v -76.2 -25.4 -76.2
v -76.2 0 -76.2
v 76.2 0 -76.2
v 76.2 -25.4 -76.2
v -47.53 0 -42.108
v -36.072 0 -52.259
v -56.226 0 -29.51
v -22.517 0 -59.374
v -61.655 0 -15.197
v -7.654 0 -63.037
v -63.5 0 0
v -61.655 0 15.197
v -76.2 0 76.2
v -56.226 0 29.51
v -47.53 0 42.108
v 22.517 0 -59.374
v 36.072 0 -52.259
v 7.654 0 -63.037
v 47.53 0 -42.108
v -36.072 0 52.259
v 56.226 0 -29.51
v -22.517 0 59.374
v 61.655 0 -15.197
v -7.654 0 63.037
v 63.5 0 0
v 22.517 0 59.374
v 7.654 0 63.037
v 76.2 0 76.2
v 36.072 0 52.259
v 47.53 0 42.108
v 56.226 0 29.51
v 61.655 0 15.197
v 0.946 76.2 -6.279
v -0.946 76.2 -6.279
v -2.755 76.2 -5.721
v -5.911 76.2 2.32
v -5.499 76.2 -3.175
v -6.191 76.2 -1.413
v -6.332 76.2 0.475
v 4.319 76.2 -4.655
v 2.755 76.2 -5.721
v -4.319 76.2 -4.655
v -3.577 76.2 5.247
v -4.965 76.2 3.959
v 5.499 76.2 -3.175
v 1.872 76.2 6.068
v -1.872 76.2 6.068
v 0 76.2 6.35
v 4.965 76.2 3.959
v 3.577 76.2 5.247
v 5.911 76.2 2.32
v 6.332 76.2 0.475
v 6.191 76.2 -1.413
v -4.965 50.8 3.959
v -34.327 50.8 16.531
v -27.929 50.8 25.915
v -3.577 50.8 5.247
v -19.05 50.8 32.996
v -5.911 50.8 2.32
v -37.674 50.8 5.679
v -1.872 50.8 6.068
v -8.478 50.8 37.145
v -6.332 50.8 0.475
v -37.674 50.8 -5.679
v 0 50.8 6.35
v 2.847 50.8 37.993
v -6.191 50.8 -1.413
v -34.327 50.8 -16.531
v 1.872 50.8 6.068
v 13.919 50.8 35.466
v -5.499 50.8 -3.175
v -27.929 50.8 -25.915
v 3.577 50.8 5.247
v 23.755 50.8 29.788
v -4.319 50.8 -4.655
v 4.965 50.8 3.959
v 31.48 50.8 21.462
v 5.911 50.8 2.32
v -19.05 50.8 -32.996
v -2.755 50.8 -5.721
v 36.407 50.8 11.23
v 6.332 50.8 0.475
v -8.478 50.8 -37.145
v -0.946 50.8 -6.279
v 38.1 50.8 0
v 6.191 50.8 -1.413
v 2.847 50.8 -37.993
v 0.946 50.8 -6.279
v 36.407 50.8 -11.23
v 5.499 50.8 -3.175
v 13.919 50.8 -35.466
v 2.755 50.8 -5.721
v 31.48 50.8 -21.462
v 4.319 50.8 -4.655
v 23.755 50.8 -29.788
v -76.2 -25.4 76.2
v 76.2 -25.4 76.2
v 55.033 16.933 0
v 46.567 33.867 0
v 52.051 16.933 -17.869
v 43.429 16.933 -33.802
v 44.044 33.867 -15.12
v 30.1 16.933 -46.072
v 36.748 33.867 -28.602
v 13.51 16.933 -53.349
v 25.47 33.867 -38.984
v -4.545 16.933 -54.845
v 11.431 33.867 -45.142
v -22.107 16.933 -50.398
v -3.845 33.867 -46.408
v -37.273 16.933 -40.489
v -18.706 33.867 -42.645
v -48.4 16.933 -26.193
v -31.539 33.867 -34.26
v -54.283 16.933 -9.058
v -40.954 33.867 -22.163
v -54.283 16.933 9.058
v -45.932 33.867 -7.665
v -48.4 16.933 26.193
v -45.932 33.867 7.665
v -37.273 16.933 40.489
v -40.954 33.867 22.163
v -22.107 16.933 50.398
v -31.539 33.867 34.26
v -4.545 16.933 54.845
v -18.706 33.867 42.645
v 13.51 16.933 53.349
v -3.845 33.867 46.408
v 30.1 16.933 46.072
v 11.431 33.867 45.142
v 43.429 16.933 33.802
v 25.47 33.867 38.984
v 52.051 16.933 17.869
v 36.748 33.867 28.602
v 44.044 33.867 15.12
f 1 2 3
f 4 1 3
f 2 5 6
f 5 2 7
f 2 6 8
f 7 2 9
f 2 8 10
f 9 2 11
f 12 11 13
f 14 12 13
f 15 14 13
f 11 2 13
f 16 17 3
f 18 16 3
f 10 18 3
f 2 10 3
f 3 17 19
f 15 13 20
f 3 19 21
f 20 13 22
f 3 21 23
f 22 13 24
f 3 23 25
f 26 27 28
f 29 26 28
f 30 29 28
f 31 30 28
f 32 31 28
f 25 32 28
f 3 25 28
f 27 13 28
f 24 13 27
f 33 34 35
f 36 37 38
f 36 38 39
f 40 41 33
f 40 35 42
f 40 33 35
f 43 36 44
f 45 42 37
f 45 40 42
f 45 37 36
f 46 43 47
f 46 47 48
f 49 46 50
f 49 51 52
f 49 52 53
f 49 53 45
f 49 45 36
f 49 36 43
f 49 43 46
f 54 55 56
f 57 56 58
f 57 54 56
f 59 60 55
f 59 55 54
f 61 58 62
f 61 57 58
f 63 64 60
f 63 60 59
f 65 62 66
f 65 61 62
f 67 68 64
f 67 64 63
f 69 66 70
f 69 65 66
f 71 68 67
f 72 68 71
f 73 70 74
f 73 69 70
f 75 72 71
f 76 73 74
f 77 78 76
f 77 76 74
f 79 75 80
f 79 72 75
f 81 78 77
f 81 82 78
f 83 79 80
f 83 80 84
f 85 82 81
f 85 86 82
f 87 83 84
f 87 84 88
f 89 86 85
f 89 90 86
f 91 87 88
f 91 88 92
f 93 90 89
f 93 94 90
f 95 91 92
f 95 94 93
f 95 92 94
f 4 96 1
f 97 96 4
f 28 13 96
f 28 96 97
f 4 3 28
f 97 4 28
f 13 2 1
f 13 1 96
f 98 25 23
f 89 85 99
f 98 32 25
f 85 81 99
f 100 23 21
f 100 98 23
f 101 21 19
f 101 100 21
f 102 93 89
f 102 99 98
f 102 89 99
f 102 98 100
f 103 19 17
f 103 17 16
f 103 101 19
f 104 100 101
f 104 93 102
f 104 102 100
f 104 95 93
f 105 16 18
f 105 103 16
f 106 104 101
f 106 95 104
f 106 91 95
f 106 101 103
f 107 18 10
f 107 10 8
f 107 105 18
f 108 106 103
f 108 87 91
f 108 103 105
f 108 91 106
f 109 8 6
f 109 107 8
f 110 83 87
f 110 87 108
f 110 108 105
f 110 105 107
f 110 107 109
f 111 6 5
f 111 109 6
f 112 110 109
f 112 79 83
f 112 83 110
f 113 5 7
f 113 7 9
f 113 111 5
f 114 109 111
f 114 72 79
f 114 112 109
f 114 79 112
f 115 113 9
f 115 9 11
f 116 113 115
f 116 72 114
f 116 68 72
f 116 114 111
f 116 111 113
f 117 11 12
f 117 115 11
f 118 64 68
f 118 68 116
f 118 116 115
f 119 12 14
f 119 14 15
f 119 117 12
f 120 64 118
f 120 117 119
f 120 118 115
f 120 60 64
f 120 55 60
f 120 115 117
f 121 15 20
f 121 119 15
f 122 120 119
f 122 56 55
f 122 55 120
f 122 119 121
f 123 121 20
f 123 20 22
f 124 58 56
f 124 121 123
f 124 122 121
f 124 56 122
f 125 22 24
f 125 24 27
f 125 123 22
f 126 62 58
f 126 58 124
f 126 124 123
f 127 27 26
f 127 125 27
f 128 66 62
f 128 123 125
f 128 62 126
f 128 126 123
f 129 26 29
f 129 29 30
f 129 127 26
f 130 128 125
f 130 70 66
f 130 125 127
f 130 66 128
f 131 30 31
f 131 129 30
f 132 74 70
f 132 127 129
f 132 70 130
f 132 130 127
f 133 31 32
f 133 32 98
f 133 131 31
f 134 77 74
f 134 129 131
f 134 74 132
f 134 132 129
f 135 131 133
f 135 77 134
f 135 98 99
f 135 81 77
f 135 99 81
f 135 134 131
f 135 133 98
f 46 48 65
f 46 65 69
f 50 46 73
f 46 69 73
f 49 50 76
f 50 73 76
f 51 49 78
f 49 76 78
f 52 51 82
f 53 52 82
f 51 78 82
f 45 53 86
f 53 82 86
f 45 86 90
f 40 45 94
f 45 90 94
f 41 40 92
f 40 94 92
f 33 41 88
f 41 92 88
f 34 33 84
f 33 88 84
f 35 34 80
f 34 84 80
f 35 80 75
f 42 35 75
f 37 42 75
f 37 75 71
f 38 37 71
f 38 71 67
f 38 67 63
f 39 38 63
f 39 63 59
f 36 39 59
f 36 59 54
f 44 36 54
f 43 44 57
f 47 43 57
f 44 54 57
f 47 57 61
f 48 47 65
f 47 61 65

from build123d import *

# Parameters (mm, degrees)
SKETCH3_R           = 63.5
SKETCH5_R           = 38.1
SKETCH6_W           = 152.4
SKETCH6_H           = 152.4
BOSS_EXTRUDE1_DEPTH = 25.4
SKETCH7_R           = 6.35
BOSS_EXTRUDE2_DEPTH = 25.4


with BuildPart() as part:
    # Sketch3 → Loft1 section 0
    with BuildSketch(Plane(origin=(0, 0, 0), x_dir=(1, 0, 0), z_dir=(0, 1, 0))):
        Circle(SKETCH3_R)
    # Sketch5 → Loft1 section 1
    with BuildSketch(Plane(origin=(0, 50.8, 0), x_dir=(1, 0, 0), z_dir=(0, 1, 0))):
        Circle(SKETCH5_R)
    loft()

    # Sketch6 → Boss-Extrude1 (add)
    with BuildSketch(Plane.XZ):
        Rectangle(SKETCH6_W, SKETCH6_H)
    extrude(amount=BOSS_EXTRUDE1_DEPTH)

    # Sketch7 → Boss-Extrude2 (add)
    with BuildSketch(Plane(origin=(0, 50.8, 0), x_dir=(1, 0, 0), z_dir=(0, 1, 0))):
        with Locations(Location((0, 0, 0), (0, 0, 270))):
            Circle(SKETCH7_R)
    extrude(amount=BOSS_EXTRUDE2_DEPTH)


solid = part.part
